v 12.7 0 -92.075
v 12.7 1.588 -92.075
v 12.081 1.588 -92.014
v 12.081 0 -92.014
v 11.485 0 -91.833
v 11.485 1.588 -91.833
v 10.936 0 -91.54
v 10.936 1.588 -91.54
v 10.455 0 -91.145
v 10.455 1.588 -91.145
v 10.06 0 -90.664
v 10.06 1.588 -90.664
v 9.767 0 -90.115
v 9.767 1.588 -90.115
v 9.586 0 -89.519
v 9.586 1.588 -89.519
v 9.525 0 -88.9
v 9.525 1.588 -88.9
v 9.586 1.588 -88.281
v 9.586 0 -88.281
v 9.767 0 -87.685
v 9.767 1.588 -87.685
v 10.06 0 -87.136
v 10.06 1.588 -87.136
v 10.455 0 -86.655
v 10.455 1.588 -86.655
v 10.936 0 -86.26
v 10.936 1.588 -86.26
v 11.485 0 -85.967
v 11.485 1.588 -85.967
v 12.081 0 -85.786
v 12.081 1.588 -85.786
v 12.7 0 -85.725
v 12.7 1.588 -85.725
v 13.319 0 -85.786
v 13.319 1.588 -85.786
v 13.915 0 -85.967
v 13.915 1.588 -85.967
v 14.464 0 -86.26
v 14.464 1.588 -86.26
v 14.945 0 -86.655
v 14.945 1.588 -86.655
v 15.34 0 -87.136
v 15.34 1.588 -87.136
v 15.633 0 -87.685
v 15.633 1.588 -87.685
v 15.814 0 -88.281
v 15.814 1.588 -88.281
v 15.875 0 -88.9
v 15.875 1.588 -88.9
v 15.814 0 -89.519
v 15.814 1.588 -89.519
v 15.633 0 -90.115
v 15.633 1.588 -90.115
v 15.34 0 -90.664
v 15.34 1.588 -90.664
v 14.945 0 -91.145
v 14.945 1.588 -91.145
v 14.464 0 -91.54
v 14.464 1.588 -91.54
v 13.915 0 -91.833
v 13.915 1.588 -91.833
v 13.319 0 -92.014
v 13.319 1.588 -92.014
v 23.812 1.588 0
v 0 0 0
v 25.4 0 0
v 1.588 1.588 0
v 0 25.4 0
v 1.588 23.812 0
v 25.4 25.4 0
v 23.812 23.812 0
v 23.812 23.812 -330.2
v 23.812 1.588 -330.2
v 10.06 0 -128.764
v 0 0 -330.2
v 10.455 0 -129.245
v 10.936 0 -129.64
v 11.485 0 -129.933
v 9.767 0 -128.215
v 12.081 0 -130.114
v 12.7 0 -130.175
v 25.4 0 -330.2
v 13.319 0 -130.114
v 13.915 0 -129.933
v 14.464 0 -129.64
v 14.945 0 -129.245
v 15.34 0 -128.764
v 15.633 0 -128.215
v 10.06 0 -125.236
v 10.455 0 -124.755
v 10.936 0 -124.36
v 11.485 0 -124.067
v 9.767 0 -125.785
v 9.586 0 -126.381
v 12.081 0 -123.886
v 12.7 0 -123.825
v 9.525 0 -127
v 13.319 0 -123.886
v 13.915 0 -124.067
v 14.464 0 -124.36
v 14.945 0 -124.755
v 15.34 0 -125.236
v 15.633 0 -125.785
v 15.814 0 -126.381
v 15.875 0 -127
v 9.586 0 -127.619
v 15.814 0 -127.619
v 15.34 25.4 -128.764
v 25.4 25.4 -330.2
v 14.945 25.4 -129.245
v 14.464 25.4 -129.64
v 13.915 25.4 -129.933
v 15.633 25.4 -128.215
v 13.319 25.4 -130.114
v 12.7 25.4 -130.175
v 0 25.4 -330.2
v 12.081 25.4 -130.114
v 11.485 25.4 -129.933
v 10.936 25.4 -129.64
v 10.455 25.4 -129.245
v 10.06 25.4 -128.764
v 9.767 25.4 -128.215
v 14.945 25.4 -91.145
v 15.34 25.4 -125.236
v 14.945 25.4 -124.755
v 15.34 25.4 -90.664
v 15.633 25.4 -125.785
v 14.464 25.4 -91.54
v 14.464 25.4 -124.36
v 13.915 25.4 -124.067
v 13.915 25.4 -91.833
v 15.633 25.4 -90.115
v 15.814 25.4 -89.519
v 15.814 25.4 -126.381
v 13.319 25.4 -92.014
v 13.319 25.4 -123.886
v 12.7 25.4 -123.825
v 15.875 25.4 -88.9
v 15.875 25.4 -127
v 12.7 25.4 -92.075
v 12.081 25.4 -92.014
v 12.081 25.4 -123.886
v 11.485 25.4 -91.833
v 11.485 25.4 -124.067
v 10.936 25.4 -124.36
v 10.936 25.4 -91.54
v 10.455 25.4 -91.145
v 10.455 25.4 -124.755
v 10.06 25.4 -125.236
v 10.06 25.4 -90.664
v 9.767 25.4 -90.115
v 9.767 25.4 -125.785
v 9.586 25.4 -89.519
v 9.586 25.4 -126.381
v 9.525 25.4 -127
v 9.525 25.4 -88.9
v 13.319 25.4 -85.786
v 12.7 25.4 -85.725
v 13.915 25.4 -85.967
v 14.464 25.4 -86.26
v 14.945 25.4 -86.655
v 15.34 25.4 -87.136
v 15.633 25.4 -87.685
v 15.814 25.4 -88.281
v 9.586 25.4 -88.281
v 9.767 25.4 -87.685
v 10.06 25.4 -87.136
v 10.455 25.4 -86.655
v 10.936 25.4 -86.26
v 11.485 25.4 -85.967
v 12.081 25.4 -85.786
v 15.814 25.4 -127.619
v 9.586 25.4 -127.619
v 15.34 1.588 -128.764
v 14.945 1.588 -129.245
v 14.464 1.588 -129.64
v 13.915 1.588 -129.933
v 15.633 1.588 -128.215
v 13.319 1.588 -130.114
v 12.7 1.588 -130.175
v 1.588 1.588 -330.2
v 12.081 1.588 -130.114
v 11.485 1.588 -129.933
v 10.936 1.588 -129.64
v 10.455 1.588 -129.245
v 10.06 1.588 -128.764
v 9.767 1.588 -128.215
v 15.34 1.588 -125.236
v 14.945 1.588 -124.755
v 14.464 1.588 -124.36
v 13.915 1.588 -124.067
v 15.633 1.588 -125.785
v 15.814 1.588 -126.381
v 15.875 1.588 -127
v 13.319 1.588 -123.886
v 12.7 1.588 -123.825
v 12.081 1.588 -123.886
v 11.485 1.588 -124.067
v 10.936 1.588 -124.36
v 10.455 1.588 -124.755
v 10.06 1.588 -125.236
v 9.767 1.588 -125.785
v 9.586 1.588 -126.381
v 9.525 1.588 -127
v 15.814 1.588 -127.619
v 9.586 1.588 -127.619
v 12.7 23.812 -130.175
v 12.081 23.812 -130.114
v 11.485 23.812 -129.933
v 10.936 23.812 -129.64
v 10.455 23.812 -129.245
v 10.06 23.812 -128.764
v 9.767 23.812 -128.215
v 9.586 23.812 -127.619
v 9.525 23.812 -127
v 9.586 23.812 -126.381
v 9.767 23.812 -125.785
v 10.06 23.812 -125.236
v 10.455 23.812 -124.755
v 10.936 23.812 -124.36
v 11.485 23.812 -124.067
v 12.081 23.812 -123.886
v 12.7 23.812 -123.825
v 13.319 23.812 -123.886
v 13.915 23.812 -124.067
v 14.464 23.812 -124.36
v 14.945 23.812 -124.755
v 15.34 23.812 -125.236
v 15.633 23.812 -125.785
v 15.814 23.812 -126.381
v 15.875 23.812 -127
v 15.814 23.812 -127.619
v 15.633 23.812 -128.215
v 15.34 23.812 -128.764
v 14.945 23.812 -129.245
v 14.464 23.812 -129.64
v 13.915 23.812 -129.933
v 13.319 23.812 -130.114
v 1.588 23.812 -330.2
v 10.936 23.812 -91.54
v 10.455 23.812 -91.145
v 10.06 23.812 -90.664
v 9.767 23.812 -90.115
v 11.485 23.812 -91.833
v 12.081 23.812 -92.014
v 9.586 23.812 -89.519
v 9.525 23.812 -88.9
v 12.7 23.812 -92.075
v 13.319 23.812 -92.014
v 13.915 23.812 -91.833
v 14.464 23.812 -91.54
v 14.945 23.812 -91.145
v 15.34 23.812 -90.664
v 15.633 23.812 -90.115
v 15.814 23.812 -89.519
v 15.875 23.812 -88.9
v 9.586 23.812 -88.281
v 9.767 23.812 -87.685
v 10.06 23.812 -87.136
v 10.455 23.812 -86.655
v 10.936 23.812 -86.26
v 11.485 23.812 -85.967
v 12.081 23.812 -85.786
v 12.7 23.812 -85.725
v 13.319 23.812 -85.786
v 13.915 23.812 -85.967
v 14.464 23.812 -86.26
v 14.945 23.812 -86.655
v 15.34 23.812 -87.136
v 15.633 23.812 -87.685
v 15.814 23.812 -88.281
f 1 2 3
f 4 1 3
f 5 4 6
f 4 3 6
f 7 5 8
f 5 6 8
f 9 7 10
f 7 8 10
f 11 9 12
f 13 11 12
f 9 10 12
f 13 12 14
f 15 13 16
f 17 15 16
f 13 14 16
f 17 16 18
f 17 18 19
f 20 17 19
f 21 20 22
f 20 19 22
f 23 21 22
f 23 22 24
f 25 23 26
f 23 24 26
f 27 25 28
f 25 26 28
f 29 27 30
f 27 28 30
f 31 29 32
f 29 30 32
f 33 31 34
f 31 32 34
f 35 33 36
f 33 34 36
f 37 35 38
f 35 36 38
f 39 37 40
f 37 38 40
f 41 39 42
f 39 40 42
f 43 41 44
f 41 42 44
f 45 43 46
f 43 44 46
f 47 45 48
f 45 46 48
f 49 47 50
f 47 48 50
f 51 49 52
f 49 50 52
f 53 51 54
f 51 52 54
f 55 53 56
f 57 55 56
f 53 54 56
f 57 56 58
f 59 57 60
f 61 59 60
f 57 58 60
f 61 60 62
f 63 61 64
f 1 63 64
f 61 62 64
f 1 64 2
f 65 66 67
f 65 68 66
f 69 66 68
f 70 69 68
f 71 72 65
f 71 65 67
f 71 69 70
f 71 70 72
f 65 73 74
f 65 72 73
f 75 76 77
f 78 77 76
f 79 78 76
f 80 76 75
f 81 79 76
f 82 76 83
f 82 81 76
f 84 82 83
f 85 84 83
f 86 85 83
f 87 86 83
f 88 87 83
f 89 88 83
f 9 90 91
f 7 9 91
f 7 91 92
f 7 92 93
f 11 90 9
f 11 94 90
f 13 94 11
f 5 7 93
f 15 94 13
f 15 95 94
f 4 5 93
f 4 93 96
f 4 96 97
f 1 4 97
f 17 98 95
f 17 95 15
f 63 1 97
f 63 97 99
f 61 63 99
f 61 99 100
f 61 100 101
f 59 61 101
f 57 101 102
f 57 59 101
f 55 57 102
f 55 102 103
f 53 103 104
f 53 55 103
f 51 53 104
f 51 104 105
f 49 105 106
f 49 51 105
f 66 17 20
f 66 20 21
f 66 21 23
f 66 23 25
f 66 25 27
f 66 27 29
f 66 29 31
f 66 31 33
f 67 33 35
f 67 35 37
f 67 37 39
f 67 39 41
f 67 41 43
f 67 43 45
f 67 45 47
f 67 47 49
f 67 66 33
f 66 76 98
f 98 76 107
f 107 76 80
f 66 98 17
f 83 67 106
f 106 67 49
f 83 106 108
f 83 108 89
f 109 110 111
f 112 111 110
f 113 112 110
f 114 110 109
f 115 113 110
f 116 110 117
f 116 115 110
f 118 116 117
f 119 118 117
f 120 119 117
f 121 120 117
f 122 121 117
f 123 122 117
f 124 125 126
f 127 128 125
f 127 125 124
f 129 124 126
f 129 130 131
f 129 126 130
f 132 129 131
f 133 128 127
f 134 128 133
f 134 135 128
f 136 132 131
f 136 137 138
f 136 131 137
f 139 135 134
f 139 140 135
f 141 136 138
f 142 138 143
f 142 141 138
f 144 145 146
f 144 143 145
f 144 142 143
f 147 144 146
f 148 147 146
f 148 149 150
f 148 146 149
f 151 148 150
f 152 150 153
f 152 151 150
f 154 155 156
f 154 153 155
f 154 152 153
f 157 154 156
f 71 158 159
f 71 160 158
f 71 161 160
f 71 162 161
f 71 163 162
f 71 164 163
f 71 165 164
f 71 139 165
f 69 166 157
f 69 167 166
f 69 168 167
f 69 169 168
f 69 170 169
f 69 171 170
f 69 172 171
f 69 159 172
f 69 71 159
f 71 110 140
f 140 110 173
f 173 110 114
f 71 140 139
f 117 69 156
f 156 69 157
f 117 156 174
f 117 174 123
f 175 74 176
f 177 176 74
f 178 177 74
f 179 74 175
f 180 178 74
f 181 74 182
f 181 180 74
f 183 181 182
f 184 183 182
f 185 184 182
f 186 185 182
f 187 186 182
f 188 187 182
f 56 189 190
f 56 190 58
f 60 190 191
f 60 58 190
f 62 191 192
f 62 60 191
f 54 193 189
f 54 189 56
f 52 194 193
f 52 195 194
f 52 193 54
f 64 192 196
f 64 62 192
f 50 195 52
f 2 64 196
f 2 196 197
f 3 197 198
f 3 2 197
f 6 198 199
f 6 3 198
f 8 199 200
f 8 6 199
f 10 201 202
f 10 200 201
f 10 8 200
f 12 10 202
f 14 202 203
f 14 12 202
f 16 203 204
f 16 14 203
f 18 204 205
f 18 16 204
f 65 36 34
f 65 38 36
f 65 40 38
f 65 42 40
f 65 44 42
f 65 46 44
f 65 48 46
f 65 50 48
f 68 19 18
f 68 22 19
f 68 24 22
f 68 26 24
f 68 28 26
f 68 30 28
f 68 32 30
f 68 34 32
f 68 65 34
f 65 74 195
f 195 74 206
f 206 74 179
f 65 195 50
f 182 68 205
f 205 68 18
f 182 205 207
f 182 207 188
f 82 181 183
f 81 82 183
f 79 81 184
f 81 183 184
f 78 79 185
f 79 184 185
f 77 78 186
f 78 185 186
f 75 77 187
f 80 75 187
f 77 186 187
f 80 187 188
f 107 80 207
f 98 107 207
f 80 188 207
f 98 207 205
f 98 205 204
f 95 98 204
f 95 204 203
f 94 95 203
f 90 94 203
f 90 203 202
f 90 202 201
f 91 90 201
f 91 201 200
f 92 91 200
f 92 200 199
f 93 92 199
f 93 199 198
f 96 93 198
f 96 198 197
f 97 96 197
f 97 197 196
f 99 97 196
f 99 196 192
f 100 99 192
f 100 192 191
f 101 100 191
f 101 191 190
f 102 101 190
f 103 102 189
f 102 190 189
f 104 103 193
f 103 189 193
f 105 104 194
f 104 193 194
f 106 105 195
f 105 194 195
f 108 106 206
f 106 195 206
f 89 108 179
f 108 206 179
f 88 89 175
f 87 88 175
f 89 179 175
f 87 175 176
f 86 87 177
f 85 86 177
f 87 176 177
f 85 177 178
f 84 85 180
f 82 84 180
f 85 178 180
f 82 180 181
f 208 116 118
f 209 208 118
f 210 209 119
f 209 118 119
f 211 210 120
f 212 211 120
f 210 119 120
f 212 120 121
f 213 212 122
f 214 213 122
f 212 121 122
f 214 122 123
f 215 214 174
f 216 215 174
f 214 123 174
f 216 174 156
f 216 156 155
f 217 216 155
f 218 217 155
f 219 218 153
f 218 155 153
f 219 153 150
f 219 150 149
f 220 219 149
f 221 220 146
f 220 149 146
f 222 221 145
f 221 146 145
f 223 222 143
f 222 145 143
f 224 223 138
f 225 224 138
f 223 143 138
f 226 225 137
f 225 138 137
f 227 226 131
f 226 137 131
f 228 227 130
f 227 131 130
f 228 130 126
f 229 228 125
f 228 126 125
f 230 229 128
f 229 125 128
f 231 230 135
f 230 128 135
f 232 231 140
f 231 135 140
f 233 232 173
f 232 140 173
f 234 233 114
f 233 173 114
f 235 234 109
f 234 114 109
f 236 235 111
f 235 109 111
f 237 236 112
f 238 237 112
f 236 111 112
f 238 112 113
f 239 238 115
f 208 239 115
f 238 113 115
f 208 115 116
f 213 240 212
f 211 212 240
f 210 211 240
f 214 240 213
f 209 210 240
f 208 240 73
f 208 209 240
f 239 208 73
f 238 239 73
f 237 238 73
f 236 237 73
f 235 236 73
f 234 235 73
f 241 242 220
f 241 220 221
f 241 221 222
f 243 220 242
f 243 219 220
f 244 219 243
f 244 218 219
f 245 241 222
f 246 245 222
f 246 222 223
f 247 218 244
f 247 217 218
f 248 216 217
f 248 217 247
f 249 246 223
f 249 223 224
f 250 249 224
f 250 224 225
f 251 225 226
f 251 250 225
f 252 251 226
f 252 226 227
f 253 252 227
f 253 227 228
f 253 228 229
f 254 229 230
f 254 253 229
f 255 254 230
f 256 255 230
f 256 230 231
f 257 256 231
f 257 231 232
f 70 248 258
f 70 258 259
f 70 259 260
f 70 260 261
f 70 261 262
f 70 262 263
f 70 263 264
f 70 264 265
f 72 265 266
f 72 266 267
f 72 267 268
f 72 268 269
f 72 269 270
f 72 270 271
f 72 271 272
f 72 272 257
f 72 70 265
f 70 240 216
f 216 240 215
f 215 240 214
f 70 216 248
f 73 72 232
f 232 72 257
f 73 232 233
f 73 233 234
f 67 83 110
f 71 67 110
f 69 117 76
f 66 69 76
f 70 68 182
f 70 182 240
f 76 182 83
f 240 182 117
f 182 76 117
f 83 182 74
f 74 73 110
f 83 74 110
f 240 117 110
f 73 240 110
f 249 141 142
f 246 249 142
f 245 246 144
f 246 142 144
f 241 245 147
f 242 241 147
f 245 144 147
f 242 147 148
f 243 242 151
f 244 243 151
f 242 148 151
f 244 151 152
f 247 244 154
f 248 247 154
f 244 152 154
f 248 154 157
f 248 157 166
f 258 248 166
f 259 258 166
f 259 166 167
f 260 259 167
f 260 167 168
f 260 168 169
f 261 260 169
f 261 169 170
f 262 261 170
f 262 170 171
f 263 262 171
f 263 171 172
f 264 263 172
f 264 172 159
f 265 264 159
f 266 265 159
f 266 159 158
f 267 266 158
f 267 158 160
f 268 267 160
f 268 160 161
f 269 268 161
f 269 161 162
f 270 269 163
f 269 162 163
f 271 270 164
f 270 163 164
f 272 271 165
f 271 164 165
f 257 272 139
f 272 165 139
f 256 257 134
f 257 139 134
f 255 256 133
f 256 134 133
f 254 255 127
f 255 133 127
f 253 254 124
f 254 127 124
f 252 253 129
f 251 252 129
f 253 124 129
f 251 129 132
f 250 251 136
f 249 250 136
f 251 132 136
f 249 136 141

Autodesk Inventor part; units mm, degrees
ref_plane "YZ Plane" through (0, 0, 0) normal (1, 0, 0) x (0, 1, 0)
ref_plane "XZ Plane" through (0, 0, 0) normal (0, 1, 0) x (-1, 0, 0)
ref_plane "XY Plane" through (0, 0, 0) normal (0, 0, 1) x (1, 0, 0)
sketch "Sketch1" plane through (0, 0, 0) normal (0, 0, 1) x (1, 0, 0)
  line L0 (0, 0) -> (25.4, 0)
  line L1 (25.4, 0) -> (25.4, 25.4)
  line L2 (25.4, 25.4) -> (0, 25.4)
  line L3 (0, 25.4) -> (0, 0)
  line L4 (1.5875, 23.8125) -> (23.8125, 23.8125)
  line L5 (23.8125, 23.8125) -> (23.8125, 1.5875)
  line L6 (23.8125, 1.5875) -> (1.5875, 1.5875)
  line L7 (1.5875, 1.5875) -> (1.5875, 23.8125)
  dimension "d0" = 25.4
  dimension "d1" = 25.4
  dimension "d2" = 1.5875
extrude "Extrusion1" add sketch "Sketch1" against normal blind 330.2
sketch "Sketch2" plane through (0, 0, 0) normal (0, -1, 0) x (1, 0, 0)
  line L0 (0, -330.2) -> (25.4, -330.2) projected
  point P0 (12.7, -127)
  point P1 (12.7, -88.9)
  dimension "d5" = 38.1
  dimension "d6" = 203.2
hole "Hole1" at (12.7, 0, -127) at (12.7, 0, -88.9) direction (0, 1, 0) diameter 6.35 depth 25.4 tip angle 118
properties part number "1tube_13_layer1_side"
